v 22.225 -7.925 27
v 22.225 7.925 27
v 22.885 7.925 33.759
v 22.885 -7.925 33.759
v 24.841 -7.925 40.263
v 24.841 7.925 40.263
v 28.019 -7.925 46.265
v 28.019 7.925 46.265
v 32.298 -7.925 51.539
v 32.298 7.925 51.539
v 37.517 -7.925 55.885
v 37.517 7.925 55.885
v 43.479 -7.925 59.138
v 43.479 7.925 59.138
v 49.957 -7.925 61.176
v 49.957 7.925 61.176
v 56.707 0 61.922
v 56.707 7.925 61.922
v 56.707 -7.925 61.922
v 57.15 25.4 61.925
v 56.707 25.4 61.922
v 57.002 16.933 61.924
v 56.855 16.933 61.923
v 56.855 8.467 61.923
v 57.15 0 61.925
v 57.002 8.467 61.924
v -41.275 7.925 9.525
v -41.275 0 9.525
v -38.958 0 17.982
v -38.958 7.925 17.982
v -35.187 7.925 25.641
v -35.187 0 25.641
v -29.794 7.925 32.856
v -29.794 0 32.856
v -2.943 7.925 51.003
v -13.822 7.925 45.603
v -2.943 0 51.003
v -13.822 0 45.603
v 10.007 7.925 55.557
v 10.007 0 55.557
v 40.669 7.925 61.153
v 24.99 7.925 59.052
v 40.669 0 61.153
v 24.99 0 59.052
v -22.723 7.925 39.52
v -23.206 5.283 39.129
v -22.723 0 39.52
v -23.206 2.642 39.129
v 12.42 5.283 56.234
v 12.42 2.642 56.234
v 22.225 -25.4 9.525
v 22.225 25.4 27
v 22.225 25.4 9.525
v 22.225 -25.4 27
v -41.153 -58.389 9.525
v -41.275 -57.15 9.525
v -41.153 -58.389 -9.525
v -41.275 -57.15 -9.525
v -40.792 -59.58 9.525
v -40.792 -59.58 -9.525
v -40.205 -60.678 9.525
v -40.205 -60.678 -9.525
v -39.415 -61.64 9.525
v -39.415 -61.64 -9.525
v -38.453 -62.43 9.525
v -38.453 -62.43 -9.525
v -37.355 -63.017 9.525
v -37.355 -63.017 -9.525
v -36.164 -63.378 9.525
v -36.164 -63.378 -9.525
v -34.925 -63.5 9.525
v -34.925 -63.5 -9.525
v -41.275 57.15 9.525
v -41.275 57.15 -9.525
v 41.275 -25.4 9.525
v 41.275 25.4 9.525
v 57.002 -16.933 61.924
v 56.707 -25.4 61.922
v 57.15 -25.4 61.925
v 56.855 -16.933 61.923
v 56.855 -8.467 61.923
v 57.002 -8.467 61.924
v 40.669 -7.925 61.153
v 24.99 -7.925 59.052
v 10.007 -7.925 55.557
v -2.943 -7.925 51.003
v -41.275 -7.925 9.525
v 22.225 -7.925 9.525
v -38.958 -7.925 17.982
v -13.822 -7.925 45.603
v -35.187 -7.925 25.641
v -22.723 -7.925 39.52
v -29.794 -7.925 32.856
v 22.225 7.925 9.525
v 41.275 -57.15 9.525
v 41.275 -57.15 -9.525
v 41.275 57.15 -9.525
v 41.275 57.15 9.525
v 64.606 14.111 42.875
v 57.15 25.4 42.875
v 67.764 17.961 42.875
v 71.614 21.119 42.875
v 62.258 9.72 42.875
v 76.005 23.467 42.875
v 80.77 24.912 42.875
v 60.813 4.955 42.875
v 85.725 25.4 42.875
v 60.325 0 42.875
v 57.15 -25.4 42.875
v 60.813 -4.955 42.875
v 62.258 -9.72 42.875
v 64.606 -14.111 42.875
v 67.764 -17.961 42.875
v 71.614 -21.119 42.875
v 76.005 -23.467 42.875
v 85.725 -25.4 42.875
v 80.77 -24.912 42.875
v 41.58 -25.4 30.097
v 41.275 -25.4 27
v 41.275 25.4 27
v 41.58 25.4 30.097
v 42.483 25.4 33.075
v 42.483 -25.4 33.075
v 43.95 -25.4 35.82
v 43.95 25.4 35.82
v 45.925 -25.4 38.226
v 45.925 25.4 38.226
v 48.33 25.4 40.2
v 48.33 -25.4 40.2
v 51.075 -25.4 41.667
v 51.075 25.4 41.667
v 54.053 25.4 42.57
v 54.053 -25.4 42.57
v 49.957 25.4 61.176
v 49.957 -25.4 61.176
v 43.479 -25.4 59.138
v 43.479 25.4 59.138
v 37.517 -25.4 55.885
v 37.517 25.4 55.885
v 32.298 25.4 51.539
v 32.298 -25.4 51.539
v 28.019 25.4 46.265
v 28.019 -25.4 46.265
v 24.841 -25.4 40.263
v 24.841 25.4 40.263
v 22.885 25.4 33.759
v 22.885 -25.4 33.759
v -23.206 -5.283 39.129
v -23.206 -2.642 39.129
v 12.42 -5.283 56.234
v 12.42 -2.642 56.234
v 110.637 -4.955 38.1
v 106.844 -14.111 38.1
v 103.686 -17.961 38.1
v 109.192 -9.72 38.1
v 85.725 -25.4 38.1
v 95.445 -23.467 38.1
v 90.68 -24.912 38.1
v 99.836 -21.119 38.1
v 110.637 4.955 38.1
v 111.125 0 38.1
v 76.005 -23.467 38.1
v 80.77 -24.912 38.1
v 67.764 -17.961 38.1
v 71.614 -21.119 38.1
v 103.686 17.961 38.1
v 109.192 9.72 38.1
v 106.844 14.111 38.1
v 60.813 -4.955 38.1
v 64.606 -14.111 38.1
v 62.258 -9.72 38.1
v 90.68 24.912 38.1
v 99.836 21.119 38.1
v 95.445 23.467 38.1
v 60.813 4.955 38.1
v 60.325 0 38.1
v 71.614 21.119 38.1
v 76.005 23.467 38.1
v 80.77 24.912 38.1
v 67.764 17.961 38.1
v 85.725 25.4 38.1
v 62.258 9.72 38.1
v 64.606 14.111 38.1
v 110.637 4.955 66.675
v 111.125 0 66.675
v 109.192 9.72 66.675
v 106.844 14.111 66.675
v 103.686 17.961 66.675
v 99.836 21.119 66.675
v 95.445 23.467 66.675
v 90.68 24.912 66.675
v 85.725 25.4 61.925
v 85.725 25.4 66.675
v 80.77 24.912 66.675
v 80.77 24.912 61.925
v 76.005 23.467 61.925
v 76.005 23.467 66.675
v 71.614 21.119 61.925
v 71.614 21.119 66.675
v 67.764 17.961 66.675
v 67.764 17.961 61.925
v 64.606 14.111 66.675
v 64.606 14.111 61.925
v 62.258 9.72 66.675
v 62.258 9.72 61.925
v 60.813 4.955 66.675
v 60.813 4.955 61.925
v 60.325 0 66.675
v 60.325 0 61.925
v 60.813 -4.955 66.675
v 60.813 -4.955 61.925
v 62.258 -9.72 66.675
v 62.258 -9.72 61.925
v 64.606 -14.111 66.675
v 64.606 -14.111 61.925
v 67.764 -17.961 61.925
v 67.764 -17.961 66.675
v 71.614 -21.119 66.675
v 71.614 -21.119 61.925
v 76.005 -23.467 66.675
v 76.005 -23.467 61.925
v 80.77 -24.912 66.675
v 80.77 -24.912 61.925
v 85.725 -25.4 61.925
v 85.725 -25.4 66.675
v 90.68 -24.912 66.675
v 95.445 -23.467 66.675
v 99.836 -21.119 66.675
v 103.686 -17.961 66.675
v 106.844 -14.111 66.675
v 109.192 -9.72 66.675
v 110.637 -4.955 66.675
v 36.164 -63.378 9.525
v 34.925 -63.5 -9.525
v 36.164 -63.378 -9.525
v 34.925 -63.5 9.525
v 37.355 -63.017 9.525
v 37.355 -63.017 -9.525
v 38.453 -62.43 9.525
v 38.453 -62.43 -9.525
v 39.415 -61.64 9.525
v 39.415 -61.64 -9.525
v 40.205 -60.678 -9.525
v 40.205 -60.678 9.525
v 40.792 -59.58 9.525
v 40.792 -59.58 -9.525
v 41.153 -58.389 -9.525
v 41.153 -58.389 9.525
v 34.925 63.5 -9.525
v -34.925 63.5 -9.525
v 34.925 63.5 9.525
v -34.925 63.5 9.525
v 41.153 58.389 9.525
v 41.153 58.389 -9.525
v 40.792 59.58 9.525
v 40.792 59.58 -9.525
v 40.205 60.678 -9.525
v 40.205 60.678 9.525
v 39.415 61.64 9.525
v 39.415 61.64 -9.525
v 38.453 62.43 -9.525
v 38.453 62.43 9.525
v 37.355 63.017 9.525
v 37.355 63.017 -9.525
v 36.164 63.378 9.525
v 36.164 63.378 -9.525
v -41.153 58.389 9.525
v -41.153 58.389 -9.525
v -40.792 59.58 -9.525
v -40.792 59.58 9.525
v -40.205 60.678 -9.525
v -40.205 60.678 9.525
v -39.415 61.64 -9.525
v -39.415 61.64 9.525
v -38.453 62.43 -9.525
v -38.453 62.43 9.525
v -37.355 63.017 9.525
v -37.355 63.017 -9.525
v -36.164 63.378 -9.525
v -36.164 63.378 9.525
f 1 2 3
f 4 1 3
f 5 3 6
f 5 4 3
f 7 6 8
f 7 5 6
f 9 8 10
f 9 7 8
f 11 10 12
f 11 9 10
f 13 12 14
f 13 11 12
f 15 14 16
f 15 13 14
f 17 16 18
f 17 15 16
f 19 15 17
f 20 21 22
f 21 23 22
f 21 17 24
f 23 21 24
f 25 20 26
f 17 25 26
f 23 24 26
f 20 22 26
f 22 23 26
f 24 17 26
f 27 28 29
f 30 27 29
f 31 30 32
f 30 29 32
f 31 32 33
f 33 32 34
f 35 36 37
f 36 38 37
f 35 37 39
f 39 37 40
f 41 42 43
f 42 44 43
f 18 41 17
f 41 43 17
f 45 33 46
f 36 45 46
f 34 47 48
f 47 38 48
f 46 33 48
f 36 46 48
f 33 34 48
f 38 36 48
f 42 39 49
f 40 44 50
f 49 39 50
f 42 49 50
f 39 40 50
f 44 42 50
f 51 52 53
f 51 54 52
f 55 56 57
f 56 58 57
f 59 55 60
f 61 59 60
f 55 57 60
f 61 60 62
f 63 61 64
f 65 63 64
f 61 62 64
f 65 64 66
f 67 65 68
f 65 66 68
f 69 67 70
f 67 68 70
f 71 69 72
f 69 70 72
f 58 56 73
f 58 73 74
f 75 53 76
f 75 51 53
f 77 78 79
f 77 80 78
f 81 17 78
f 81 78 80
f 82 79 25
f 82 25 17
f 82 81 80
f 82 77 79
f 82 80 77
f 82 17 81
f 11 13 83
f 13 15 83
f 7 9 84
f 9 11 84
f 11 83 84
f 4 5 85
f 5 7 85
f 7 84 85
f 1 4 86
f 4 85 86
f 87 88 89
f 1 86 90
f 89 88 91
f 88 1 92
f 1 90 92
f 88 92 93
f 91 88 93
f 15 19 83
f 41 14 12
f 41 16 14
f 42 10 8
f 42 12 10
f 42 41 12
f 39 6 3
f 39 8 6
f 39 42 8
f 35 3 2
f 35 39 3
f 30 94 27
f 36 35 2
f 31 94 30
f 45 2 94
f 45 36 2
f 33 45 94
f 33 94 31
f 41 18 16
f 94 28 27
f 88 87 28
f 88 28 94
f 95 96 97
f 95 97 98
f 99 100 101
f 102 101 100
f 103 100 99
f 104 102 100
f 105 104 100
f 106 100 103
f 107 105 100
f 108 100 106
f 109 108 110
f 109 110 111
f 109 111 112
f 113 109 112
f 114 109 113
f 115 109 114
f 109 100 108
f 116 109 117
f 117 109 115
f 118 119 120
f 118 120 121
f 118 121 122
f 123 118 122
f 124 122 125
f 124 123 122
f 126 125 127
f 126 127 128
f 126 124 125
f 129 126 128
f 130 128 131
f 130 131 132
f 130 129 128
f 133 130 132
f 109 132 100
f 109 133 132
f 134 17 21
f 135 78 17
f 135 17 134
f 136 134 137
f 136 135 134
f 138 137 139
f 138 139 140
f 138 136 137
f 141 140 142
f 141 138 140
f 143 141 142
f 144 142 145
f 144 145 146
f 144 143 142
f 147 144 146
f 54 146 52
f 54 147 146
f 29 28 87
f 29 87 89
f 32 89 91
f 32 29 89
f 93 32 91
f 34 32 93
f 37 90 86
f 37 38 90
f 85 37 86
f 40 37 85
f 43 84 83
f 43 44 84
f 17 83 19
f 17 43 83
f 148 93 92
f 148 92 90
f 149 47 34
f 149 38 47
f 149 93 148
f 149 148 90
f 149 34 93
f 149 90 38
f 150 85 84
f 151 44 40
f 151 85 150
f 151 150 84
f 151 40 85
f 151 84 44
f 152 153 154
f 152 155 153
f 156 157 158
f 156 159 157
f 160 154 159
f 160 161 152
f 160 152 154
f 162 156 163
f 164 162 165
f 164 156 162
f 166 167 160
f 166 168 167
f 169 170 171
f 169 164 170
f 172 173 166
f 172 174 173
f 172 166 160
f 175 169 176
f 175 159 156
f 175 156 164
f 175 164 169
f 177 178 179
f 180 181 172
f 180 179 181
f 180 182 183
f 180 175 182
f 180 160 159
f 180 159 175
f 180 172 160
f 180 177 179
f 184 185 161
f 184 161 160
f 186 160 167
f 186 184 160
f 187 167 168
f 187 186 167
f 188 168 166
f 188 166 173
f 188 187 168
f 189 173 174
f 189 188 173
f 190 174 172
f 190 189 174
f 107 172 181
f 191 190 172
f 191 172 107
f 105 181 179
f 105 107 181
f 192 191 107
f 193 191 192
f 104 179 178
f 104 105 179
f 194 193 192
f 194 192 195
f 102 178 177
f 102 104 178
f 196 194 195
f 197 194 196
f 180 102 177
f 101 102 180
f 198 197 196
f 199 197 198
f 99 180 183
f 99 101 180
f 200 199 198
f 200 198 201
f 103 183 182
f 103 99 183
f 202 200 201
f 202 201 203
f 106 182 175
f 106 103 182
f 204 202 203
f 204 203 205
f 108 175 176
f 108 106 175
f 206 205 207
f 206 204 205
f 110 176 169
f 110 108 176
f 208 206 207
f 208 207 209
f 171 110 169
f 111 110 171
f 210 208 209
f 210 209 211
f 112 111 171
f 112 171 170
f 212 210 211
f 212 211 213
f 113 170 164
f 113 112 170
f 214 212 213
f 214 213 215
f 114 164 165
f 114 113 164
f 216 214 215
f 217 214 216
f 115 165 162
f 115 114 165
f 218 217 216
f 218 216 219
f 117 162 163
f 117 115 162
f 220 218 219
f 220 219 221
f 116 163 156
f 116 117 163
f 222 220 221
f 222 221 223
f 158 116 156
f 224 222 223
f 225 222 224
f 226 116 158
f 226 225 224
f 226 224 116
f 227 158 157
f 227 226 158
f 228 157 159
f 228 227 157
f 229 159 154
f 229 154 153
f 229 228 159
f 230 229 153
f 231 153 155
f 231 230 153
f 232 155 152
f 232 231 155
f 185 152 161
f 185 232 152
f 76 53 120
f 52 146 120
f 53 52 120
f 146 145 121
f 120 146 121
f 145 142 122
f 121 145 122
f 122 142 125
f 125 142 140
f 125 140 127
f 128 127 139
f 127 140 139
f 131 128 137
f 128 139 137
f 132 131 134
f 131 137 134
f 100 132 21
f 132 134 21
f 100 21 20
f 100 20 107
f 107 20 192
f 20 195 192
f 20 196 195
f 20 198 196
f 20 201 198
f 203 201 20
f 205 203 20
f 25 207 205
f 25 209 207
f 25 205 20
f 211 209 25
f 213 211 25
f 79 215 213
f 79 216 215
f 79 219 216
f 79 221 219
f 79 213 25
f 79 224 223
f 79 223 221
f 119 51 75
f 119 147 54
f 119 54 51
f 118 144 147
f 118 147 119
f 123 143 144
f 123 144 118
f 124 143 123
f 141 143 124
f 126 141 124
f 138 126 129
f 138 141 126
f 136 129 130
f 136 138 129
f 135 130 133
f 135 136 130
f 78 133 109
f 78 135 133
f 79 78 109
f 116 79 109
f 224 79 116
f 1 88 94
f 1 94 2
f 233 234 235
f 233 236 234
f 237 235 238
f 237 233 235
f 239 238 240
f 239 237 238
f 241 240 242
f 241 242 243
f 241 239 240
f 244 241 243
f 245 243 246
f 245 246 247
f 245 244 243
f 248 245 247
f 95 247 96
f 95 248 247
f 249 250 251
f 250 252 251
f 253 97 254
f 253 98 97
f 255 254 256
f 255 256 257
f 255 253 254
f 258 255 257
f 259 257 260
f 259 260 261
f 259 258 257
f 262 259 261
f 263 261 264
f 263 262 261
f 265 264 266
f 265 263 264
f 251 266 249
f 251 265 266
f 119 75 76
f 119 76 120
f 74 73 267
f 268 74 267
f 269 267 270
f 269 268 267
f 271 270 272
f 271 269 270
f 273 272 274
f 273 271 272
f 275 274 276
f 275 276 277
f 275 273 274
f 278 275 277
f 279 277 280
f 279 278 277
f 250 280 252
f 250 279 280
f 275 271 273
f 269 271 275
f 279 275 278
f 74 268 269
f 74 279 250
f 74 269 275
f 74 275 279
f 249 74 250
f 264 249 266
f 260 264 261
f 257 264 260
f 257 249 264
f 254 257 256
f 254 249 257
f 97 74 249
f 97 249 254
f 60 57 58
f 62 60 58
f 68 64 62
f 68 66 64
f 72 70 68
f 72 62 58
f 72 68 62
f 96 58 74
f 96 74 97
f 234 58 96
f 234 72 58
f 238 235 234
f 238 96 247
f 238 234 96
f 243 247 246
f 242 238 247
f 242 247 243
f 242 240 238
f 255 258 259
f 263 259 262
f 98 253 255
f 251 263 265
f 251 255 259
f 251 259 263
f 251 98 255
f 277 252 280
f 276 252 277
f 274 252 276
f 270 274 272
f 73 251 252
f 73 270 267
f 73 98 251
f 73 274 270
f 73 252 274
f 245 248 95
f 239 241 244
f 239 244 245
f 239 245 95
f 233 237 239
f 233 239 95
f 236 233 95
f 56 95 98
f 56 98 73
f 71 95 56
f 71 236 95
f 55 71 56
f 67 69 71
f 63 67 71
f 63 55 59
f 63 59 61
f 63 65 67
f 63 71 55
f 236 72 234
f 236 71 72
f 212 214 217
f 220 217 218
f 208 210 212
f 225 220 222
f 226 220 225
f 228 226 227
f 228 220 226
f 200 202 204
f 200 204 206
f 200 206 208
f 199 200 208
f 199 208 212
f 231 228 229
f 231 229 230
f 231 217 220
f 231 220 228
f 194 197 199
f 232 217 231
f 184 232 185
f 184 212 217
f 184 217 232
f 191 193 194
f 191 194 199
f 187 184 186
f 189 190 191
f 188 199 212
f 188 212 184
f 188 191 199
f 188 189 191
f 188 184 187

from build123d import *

# Parameters (mm, degrees)
F1_DEPTH = 63.5
F0_W     = 25.4
F0_H     = 19.05
F2_DEPTH = 25.4
F3_DEPTH = 7.9248
F5_R     = 6.35


with BuildPart() as f1:
    # F0 (on Front) → F1 (new body, symmetric)
    with BuildSketch(Plane.XZ):
        Polygon((-41.275, -9.525), (41.275, -9.525), (41.275, 9.525), (22.225, 9.525), (-41.275, 9.525), align=None)
    extrude(amount=F1_DEPTH, both=True)

    # F5
    f5_edges = [f1.edges().sort_by_distance(p)[0] for p in [
        (-41.275, -63.5, 0),
        (41.275, -63.5, 0),
        (41.275, 63.5, 0),
        (-41.275, 63.5, 0),
    ]]
    fillet(f5_edges, radius=F5_R)


with BuildPart() as f2:
    # F0 (on Front) → F2 (new body, symmetric)
    with BuildSketch(Plane.XZ):
        with BuildLine():
            Line((22.225, 9.525), (41.275, 9.525))
            Line((41.275, 9.525), (41.275, 27.0002))
            ThreePointArc((41.275, 27.0002), (45.9246798487, 38.2255201513), (57.15, 42.8752))
            Line((57.15, 42.8752), (60.325, 42.8752))
            Line((60.325, 42.8752), (60.325, 61.9252))
            Line((60.325, 61.9252), (57.15, 61.9252))
            add(Edge.make_bspline(
                [(56.7072049676, 61.9223929088), (56.854807494, 61.923490645), (57.0024062893, 61.9244262873), (57.15, 61.9252)],
                knots=[111.1451723122, 111.1451723122, 111.1451723122, 111.1451723122, 111.5045361635, 111.5045361635, 111.5045361635, 111.5045361635], degree=3))
            ThreePointArc((56.7072049676, 61.9223929088), (32.2982370695, 51.5388532688), (22.225, 27.0002))
            Line((22.225, 27.0002), (22.225, 9.525))
        make_face()
        with Locations((73.025, 52.4002)):
            Rectangle(F0_W, F0_H)
    extrude(amount=F2_DEPTH, both=True)

    # F0 (on Front) → F4 (revolve)
    with BuildSketch(Plane.XZ):
        Polygon((85.725, 61.9252), (85.725, 42.8752), (85.725, 38.1), (111.125, 38.1), (111.125, 66.675), (85.725, 66.675), align=None)
    revolve(axis=Axis((85.725, 0, 52.3875), (0, 0, 1)))


with BuildPart() as f3:
    # F0 (on Front) → F3 (new body, symmetric)
    with BuildSketch(Plane.XZ):
        with BuildLine():
            add(Edge.make_bspline(
                [(-41.275, 9.525), (-34.9516392551, 45.7381070887), (11.0562354186, 61.5828816371), (56.7072049676, 61.9223929088)],
                knots=[0, 0, 0, 0, 111.1451723122, 111.1451723122, 111.1451723122, 111.1451723122], degree=3))
            Line((-41.275, 9.525), (22.225, 9.525))
            Line((22.225, 9.525), (22.225, 27.0002))
            ThreePointArc((22.225, 27.0002), (32.2982370695, 51.5388532688), (56.7072049676, 61.9223929088))
        make_face()
    extrude(amount=F3_DEPTH, both=True)


solid = Compound([f1.part, f2.part, f3.part])
